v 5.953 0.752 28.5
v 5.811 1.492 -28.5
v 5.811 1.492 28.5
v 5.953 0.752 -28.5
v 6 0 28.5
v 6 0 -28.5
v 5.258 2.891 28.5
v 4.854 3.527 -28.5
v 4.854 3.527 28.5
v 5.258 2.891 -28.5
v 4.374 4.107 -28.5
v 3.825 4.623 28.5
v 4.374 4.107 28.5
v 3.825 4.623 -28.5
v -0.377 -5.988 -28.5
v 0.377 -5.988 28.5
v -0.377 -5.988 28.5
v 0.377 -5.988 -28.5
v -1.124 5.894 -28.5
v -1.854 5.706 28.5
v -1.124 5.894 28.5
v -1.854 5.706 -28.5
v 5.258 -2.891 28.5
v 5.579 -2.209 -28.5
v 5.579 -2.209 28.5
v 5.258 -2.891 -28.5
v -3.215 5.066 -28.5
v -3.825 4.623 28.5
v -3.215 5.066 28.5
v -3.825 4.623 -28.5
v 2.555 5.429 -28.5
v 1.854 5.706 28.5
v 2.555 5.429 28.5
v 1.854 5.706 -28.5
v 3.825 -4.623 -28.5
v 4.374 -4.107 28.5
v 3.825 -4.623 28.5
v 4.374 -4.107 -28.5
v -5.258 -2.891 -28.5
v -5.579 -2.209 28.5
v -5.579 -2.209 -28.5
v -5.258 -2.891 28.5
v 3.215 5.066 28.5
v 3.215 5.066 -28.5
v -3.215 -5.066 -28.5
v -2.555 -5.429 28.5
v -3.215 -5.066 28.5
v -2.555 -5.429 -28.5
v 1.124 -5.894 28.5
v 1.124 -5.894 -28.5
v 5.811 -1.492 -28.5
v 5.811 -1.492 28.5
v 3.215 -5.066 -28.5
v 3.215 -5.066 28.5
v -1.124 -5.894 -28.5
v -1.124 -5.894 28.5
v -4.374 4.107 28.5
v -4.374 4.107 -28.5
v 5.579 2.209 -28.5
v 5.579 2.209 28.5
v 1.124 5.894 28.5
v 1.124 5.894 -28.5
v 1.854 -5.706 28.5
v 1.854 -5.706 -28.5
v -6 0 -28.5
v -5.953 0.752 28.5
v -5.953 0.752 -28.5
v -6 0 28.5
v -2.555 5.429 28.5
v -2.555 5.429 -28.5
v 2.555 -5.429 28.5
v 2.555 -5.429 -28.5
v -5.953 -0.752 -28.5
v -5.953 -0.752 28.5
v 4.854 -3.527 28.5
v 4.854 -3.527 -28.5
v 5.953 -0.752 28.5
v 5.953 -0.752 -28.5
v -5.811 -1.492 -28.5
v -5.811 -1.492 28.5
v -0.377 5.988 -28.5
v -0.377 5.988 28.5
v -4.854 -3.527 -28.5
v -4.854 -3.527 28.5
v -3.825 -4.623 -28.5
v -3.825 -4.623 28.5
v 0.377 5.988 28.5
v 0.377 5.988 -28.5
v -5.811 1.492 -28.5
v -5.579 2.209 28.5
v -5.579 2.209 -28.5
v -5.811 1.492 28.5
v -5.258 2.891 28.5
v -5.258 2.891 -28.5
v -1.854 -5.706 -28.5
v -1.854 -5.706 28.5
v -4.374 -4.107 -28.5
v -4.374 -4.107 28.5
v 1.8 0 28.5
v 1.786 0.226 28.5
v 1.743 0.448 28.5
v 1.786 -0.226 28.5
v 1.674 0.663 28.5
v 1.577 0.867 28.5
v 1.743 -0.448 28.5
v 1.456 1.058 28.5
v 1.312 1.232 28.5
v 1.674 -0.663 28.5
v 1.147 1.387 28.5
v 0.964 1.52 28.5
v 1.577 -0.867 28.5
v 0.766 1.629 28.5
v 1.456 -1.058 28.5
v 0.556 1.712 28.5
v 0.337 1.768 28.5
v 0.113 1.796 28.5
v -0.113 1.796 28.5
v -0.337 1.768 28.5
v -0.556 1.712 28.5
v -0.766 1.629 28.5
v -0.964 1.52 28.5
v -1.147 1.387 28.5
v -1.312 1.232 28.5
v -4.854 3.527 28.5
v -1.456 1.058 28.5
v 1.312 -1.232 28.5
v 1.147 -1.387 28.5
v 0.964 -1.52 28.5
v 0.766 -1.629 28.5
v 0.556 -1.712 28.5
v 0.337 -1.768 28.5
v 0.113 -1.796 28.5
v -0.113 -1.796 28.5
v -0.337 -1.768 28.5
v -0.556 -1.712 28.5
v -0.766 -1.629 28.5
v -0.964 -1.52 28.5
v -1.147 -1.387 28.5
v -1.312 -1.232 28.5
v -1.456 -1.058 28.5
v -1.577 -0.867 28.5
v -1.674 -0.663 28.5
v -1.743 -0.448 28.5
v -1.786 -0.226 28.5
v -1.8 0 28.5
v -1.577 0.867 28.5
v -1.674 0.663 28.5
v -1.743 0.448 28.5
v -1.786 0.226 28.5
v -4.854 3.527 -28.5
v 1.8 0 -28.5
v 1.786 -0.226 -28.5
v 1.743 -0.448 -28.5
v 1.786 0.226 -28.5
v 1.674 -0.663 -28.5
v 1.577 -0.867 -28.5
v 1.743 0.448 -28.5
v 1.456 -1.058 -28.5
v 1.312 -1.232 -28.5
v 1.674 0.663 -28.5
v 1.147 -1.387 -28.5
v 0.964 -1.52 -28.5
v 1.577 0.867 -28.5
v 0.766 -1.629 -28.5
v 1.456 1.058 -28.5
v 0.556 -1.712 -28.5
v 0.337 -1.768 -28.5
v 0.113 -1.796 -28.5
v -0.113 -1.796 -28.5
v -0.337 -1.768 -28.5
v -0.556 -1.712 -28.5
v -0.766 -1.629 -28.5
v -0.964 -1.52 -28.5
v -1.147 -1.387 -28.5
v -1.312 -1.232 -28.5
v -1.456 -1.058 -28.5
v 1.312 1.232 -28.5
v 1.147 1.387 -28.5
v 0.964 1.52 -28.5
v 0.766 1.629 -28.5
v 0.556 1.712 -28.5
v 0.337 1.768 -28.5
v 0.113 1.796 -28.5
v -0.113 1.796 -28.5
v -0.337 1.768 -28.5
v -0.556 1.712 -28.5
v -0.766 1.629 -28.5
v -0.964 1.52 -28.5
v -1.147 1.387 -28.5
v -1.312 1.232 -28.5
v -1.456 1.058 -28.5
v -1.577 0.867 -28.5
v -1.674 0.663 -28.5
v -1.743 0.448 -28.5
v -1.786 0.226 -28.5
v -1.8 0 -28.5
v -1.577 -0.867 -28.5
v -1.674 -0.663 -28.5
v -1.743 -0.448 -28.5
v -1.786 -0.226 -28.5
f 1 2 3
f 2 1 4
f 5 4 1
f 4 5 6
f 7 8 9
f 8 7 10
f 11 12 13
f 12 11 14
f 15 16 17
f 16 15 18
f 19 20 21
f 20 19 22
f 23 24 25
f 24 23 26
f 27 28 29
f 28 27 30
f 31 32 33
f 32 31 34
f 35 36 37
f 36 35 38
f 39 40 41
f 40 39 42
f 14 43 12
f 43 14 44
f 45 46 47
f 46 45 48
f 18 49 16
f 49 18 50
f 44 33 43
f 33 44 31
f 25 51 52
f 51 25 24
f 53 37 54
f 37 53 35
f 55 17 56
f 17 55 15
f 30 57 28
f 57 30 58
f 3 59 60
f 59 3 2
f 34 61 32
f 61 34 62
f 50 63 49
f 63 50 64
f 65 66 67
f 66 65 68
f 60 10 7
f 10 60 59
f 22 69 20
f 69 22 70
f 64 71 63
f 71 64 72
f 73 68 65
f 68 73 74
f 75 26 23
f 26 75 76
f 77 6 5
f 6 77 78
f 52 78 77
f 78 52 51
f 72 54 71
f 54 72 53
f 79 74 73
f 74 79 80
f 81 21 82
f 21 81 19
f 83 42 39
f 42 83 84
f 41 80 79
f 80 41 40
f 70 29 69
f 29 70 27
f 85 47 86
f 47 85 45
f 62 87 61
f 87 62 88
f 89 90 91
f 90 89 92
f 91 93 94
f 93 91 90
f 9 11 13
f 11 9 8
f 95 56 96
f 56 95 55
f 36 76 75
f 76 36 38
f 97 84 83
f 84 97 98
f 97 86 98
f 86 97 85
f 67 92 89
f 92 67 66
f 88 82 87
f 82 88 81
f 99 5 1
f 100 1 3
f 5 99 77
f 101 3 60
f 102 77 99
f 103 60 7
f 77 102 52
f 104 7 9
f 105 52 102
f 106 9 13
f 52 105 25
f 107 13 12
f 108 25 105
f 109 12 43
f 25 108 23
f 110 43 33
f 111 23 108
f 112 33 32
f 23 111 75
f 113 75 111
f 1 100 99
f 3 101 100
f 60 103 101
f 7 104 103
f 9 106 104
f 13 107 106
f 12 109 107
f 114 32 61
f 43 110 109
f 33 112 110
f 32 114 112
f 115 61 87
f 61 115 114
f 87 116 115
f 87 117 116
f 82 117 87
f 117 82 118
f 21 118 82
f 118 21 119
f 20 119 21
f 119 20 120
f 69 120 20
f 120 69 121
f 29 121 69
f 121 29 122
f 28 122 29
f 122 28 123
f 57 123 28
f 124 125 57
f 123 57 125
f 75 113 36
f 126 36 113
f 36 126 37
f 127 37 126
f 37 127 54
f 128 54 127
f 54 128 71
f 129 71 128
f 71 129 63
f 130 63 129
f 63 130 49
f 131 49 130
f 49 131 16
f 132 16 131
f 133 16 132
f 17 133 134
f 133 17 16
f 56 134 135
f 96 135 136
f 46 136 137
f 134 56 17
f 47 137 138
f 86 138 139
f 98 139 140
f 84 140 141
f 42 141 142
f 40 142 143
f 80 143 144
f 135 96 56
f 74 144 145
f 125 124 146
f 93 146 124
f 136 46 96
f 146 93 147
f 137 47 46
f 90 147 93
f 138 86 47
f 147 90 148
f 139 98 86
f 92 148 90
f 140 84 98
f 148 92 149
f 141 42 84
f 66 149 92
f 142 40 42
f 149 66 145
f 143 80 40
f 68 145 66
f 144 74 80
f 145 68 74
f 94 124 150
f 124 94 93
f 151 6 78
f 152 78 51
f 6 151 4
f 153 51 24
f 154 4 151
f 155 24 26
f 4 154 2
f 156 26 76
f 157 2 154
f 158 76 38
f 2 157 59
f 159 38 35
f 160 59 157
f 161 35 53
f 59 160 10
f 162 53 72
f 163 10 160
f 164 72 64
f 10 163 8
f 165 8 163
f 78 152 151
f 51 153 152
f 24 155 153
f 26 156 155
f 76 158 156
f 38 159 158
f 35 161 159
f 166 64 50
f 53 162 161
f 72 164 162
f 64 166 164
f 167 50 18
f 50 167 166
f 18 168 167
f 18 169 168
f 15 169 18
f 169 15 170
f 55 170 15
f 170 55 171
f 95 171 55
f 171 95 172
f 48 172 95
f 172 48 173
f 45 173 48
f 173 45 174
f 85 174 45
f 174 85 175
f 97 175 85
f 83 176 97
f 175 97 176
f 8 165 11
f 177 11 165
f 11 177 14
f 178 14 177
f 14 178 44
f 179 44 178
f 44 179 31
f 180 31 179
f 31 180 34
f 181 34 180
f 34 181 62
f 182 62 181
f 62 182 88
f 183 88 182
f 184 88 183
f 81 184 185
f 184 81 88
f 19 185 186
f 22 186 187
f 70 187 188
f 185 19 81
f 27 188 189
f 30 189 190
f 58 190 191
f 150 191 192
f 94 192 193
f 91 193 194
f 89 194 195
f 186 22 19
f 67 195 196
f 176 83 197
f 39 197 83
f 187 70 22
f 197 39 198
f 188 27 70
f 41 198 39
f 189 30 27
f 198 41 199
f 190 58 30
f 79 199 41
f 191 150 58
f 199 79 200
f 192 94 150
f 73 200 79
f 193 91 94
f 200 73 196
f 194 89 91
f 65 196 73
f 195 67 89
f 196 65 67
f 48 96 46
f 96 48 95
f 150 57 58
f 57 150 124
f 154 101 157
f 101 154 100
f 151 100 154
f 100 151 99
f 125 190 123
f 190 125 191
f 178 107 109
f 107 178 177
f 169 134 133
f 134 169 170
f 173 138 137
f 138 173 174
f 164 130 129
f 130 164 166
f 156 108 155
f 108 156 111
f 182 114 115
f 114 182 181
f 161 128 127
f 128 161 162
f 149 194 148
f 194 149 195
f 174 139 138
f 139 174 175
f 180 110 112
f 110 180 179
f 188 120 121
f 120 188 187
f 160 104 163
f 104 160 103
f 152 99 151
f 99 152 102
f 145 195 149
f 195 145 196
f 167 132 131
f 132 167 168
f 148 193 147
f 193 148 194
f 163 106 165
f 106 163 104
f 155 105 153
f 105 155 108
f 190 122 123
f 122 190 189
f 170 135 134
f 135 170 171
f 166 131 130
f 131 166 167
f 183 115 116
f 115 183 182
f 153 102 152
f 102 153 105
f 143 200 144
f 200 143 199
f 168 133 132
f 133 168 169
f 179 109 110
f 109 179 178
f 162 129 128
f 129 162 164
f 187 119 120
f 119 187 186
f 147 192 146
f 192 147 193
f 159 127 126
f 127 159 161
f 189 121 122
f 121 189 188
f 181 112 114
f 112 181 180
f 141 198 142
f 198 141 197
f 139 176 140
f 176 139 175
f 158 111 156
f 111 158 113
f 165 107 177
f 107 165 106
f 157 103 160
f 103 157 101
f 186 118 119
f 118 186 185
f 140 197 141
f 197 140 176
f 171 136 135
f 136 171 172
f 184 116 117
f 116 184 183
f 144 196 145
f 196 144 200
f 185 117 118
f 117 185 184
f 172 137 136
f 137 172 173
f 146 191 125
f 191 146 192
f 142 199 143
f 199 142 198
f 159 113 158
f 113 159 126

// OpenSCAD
$fn = 50;


difference() {
	union() {
		translate(v = [0, 0, -28.5000000000]) {
			cylinder(h = 57, r = 6.0000000000);
		}
	}
	union() {
		#translate(v = [0, 0, -100.0000000000]) {
			cylinder(h = 200, r = 1.8000000000);
		}
	}
}
